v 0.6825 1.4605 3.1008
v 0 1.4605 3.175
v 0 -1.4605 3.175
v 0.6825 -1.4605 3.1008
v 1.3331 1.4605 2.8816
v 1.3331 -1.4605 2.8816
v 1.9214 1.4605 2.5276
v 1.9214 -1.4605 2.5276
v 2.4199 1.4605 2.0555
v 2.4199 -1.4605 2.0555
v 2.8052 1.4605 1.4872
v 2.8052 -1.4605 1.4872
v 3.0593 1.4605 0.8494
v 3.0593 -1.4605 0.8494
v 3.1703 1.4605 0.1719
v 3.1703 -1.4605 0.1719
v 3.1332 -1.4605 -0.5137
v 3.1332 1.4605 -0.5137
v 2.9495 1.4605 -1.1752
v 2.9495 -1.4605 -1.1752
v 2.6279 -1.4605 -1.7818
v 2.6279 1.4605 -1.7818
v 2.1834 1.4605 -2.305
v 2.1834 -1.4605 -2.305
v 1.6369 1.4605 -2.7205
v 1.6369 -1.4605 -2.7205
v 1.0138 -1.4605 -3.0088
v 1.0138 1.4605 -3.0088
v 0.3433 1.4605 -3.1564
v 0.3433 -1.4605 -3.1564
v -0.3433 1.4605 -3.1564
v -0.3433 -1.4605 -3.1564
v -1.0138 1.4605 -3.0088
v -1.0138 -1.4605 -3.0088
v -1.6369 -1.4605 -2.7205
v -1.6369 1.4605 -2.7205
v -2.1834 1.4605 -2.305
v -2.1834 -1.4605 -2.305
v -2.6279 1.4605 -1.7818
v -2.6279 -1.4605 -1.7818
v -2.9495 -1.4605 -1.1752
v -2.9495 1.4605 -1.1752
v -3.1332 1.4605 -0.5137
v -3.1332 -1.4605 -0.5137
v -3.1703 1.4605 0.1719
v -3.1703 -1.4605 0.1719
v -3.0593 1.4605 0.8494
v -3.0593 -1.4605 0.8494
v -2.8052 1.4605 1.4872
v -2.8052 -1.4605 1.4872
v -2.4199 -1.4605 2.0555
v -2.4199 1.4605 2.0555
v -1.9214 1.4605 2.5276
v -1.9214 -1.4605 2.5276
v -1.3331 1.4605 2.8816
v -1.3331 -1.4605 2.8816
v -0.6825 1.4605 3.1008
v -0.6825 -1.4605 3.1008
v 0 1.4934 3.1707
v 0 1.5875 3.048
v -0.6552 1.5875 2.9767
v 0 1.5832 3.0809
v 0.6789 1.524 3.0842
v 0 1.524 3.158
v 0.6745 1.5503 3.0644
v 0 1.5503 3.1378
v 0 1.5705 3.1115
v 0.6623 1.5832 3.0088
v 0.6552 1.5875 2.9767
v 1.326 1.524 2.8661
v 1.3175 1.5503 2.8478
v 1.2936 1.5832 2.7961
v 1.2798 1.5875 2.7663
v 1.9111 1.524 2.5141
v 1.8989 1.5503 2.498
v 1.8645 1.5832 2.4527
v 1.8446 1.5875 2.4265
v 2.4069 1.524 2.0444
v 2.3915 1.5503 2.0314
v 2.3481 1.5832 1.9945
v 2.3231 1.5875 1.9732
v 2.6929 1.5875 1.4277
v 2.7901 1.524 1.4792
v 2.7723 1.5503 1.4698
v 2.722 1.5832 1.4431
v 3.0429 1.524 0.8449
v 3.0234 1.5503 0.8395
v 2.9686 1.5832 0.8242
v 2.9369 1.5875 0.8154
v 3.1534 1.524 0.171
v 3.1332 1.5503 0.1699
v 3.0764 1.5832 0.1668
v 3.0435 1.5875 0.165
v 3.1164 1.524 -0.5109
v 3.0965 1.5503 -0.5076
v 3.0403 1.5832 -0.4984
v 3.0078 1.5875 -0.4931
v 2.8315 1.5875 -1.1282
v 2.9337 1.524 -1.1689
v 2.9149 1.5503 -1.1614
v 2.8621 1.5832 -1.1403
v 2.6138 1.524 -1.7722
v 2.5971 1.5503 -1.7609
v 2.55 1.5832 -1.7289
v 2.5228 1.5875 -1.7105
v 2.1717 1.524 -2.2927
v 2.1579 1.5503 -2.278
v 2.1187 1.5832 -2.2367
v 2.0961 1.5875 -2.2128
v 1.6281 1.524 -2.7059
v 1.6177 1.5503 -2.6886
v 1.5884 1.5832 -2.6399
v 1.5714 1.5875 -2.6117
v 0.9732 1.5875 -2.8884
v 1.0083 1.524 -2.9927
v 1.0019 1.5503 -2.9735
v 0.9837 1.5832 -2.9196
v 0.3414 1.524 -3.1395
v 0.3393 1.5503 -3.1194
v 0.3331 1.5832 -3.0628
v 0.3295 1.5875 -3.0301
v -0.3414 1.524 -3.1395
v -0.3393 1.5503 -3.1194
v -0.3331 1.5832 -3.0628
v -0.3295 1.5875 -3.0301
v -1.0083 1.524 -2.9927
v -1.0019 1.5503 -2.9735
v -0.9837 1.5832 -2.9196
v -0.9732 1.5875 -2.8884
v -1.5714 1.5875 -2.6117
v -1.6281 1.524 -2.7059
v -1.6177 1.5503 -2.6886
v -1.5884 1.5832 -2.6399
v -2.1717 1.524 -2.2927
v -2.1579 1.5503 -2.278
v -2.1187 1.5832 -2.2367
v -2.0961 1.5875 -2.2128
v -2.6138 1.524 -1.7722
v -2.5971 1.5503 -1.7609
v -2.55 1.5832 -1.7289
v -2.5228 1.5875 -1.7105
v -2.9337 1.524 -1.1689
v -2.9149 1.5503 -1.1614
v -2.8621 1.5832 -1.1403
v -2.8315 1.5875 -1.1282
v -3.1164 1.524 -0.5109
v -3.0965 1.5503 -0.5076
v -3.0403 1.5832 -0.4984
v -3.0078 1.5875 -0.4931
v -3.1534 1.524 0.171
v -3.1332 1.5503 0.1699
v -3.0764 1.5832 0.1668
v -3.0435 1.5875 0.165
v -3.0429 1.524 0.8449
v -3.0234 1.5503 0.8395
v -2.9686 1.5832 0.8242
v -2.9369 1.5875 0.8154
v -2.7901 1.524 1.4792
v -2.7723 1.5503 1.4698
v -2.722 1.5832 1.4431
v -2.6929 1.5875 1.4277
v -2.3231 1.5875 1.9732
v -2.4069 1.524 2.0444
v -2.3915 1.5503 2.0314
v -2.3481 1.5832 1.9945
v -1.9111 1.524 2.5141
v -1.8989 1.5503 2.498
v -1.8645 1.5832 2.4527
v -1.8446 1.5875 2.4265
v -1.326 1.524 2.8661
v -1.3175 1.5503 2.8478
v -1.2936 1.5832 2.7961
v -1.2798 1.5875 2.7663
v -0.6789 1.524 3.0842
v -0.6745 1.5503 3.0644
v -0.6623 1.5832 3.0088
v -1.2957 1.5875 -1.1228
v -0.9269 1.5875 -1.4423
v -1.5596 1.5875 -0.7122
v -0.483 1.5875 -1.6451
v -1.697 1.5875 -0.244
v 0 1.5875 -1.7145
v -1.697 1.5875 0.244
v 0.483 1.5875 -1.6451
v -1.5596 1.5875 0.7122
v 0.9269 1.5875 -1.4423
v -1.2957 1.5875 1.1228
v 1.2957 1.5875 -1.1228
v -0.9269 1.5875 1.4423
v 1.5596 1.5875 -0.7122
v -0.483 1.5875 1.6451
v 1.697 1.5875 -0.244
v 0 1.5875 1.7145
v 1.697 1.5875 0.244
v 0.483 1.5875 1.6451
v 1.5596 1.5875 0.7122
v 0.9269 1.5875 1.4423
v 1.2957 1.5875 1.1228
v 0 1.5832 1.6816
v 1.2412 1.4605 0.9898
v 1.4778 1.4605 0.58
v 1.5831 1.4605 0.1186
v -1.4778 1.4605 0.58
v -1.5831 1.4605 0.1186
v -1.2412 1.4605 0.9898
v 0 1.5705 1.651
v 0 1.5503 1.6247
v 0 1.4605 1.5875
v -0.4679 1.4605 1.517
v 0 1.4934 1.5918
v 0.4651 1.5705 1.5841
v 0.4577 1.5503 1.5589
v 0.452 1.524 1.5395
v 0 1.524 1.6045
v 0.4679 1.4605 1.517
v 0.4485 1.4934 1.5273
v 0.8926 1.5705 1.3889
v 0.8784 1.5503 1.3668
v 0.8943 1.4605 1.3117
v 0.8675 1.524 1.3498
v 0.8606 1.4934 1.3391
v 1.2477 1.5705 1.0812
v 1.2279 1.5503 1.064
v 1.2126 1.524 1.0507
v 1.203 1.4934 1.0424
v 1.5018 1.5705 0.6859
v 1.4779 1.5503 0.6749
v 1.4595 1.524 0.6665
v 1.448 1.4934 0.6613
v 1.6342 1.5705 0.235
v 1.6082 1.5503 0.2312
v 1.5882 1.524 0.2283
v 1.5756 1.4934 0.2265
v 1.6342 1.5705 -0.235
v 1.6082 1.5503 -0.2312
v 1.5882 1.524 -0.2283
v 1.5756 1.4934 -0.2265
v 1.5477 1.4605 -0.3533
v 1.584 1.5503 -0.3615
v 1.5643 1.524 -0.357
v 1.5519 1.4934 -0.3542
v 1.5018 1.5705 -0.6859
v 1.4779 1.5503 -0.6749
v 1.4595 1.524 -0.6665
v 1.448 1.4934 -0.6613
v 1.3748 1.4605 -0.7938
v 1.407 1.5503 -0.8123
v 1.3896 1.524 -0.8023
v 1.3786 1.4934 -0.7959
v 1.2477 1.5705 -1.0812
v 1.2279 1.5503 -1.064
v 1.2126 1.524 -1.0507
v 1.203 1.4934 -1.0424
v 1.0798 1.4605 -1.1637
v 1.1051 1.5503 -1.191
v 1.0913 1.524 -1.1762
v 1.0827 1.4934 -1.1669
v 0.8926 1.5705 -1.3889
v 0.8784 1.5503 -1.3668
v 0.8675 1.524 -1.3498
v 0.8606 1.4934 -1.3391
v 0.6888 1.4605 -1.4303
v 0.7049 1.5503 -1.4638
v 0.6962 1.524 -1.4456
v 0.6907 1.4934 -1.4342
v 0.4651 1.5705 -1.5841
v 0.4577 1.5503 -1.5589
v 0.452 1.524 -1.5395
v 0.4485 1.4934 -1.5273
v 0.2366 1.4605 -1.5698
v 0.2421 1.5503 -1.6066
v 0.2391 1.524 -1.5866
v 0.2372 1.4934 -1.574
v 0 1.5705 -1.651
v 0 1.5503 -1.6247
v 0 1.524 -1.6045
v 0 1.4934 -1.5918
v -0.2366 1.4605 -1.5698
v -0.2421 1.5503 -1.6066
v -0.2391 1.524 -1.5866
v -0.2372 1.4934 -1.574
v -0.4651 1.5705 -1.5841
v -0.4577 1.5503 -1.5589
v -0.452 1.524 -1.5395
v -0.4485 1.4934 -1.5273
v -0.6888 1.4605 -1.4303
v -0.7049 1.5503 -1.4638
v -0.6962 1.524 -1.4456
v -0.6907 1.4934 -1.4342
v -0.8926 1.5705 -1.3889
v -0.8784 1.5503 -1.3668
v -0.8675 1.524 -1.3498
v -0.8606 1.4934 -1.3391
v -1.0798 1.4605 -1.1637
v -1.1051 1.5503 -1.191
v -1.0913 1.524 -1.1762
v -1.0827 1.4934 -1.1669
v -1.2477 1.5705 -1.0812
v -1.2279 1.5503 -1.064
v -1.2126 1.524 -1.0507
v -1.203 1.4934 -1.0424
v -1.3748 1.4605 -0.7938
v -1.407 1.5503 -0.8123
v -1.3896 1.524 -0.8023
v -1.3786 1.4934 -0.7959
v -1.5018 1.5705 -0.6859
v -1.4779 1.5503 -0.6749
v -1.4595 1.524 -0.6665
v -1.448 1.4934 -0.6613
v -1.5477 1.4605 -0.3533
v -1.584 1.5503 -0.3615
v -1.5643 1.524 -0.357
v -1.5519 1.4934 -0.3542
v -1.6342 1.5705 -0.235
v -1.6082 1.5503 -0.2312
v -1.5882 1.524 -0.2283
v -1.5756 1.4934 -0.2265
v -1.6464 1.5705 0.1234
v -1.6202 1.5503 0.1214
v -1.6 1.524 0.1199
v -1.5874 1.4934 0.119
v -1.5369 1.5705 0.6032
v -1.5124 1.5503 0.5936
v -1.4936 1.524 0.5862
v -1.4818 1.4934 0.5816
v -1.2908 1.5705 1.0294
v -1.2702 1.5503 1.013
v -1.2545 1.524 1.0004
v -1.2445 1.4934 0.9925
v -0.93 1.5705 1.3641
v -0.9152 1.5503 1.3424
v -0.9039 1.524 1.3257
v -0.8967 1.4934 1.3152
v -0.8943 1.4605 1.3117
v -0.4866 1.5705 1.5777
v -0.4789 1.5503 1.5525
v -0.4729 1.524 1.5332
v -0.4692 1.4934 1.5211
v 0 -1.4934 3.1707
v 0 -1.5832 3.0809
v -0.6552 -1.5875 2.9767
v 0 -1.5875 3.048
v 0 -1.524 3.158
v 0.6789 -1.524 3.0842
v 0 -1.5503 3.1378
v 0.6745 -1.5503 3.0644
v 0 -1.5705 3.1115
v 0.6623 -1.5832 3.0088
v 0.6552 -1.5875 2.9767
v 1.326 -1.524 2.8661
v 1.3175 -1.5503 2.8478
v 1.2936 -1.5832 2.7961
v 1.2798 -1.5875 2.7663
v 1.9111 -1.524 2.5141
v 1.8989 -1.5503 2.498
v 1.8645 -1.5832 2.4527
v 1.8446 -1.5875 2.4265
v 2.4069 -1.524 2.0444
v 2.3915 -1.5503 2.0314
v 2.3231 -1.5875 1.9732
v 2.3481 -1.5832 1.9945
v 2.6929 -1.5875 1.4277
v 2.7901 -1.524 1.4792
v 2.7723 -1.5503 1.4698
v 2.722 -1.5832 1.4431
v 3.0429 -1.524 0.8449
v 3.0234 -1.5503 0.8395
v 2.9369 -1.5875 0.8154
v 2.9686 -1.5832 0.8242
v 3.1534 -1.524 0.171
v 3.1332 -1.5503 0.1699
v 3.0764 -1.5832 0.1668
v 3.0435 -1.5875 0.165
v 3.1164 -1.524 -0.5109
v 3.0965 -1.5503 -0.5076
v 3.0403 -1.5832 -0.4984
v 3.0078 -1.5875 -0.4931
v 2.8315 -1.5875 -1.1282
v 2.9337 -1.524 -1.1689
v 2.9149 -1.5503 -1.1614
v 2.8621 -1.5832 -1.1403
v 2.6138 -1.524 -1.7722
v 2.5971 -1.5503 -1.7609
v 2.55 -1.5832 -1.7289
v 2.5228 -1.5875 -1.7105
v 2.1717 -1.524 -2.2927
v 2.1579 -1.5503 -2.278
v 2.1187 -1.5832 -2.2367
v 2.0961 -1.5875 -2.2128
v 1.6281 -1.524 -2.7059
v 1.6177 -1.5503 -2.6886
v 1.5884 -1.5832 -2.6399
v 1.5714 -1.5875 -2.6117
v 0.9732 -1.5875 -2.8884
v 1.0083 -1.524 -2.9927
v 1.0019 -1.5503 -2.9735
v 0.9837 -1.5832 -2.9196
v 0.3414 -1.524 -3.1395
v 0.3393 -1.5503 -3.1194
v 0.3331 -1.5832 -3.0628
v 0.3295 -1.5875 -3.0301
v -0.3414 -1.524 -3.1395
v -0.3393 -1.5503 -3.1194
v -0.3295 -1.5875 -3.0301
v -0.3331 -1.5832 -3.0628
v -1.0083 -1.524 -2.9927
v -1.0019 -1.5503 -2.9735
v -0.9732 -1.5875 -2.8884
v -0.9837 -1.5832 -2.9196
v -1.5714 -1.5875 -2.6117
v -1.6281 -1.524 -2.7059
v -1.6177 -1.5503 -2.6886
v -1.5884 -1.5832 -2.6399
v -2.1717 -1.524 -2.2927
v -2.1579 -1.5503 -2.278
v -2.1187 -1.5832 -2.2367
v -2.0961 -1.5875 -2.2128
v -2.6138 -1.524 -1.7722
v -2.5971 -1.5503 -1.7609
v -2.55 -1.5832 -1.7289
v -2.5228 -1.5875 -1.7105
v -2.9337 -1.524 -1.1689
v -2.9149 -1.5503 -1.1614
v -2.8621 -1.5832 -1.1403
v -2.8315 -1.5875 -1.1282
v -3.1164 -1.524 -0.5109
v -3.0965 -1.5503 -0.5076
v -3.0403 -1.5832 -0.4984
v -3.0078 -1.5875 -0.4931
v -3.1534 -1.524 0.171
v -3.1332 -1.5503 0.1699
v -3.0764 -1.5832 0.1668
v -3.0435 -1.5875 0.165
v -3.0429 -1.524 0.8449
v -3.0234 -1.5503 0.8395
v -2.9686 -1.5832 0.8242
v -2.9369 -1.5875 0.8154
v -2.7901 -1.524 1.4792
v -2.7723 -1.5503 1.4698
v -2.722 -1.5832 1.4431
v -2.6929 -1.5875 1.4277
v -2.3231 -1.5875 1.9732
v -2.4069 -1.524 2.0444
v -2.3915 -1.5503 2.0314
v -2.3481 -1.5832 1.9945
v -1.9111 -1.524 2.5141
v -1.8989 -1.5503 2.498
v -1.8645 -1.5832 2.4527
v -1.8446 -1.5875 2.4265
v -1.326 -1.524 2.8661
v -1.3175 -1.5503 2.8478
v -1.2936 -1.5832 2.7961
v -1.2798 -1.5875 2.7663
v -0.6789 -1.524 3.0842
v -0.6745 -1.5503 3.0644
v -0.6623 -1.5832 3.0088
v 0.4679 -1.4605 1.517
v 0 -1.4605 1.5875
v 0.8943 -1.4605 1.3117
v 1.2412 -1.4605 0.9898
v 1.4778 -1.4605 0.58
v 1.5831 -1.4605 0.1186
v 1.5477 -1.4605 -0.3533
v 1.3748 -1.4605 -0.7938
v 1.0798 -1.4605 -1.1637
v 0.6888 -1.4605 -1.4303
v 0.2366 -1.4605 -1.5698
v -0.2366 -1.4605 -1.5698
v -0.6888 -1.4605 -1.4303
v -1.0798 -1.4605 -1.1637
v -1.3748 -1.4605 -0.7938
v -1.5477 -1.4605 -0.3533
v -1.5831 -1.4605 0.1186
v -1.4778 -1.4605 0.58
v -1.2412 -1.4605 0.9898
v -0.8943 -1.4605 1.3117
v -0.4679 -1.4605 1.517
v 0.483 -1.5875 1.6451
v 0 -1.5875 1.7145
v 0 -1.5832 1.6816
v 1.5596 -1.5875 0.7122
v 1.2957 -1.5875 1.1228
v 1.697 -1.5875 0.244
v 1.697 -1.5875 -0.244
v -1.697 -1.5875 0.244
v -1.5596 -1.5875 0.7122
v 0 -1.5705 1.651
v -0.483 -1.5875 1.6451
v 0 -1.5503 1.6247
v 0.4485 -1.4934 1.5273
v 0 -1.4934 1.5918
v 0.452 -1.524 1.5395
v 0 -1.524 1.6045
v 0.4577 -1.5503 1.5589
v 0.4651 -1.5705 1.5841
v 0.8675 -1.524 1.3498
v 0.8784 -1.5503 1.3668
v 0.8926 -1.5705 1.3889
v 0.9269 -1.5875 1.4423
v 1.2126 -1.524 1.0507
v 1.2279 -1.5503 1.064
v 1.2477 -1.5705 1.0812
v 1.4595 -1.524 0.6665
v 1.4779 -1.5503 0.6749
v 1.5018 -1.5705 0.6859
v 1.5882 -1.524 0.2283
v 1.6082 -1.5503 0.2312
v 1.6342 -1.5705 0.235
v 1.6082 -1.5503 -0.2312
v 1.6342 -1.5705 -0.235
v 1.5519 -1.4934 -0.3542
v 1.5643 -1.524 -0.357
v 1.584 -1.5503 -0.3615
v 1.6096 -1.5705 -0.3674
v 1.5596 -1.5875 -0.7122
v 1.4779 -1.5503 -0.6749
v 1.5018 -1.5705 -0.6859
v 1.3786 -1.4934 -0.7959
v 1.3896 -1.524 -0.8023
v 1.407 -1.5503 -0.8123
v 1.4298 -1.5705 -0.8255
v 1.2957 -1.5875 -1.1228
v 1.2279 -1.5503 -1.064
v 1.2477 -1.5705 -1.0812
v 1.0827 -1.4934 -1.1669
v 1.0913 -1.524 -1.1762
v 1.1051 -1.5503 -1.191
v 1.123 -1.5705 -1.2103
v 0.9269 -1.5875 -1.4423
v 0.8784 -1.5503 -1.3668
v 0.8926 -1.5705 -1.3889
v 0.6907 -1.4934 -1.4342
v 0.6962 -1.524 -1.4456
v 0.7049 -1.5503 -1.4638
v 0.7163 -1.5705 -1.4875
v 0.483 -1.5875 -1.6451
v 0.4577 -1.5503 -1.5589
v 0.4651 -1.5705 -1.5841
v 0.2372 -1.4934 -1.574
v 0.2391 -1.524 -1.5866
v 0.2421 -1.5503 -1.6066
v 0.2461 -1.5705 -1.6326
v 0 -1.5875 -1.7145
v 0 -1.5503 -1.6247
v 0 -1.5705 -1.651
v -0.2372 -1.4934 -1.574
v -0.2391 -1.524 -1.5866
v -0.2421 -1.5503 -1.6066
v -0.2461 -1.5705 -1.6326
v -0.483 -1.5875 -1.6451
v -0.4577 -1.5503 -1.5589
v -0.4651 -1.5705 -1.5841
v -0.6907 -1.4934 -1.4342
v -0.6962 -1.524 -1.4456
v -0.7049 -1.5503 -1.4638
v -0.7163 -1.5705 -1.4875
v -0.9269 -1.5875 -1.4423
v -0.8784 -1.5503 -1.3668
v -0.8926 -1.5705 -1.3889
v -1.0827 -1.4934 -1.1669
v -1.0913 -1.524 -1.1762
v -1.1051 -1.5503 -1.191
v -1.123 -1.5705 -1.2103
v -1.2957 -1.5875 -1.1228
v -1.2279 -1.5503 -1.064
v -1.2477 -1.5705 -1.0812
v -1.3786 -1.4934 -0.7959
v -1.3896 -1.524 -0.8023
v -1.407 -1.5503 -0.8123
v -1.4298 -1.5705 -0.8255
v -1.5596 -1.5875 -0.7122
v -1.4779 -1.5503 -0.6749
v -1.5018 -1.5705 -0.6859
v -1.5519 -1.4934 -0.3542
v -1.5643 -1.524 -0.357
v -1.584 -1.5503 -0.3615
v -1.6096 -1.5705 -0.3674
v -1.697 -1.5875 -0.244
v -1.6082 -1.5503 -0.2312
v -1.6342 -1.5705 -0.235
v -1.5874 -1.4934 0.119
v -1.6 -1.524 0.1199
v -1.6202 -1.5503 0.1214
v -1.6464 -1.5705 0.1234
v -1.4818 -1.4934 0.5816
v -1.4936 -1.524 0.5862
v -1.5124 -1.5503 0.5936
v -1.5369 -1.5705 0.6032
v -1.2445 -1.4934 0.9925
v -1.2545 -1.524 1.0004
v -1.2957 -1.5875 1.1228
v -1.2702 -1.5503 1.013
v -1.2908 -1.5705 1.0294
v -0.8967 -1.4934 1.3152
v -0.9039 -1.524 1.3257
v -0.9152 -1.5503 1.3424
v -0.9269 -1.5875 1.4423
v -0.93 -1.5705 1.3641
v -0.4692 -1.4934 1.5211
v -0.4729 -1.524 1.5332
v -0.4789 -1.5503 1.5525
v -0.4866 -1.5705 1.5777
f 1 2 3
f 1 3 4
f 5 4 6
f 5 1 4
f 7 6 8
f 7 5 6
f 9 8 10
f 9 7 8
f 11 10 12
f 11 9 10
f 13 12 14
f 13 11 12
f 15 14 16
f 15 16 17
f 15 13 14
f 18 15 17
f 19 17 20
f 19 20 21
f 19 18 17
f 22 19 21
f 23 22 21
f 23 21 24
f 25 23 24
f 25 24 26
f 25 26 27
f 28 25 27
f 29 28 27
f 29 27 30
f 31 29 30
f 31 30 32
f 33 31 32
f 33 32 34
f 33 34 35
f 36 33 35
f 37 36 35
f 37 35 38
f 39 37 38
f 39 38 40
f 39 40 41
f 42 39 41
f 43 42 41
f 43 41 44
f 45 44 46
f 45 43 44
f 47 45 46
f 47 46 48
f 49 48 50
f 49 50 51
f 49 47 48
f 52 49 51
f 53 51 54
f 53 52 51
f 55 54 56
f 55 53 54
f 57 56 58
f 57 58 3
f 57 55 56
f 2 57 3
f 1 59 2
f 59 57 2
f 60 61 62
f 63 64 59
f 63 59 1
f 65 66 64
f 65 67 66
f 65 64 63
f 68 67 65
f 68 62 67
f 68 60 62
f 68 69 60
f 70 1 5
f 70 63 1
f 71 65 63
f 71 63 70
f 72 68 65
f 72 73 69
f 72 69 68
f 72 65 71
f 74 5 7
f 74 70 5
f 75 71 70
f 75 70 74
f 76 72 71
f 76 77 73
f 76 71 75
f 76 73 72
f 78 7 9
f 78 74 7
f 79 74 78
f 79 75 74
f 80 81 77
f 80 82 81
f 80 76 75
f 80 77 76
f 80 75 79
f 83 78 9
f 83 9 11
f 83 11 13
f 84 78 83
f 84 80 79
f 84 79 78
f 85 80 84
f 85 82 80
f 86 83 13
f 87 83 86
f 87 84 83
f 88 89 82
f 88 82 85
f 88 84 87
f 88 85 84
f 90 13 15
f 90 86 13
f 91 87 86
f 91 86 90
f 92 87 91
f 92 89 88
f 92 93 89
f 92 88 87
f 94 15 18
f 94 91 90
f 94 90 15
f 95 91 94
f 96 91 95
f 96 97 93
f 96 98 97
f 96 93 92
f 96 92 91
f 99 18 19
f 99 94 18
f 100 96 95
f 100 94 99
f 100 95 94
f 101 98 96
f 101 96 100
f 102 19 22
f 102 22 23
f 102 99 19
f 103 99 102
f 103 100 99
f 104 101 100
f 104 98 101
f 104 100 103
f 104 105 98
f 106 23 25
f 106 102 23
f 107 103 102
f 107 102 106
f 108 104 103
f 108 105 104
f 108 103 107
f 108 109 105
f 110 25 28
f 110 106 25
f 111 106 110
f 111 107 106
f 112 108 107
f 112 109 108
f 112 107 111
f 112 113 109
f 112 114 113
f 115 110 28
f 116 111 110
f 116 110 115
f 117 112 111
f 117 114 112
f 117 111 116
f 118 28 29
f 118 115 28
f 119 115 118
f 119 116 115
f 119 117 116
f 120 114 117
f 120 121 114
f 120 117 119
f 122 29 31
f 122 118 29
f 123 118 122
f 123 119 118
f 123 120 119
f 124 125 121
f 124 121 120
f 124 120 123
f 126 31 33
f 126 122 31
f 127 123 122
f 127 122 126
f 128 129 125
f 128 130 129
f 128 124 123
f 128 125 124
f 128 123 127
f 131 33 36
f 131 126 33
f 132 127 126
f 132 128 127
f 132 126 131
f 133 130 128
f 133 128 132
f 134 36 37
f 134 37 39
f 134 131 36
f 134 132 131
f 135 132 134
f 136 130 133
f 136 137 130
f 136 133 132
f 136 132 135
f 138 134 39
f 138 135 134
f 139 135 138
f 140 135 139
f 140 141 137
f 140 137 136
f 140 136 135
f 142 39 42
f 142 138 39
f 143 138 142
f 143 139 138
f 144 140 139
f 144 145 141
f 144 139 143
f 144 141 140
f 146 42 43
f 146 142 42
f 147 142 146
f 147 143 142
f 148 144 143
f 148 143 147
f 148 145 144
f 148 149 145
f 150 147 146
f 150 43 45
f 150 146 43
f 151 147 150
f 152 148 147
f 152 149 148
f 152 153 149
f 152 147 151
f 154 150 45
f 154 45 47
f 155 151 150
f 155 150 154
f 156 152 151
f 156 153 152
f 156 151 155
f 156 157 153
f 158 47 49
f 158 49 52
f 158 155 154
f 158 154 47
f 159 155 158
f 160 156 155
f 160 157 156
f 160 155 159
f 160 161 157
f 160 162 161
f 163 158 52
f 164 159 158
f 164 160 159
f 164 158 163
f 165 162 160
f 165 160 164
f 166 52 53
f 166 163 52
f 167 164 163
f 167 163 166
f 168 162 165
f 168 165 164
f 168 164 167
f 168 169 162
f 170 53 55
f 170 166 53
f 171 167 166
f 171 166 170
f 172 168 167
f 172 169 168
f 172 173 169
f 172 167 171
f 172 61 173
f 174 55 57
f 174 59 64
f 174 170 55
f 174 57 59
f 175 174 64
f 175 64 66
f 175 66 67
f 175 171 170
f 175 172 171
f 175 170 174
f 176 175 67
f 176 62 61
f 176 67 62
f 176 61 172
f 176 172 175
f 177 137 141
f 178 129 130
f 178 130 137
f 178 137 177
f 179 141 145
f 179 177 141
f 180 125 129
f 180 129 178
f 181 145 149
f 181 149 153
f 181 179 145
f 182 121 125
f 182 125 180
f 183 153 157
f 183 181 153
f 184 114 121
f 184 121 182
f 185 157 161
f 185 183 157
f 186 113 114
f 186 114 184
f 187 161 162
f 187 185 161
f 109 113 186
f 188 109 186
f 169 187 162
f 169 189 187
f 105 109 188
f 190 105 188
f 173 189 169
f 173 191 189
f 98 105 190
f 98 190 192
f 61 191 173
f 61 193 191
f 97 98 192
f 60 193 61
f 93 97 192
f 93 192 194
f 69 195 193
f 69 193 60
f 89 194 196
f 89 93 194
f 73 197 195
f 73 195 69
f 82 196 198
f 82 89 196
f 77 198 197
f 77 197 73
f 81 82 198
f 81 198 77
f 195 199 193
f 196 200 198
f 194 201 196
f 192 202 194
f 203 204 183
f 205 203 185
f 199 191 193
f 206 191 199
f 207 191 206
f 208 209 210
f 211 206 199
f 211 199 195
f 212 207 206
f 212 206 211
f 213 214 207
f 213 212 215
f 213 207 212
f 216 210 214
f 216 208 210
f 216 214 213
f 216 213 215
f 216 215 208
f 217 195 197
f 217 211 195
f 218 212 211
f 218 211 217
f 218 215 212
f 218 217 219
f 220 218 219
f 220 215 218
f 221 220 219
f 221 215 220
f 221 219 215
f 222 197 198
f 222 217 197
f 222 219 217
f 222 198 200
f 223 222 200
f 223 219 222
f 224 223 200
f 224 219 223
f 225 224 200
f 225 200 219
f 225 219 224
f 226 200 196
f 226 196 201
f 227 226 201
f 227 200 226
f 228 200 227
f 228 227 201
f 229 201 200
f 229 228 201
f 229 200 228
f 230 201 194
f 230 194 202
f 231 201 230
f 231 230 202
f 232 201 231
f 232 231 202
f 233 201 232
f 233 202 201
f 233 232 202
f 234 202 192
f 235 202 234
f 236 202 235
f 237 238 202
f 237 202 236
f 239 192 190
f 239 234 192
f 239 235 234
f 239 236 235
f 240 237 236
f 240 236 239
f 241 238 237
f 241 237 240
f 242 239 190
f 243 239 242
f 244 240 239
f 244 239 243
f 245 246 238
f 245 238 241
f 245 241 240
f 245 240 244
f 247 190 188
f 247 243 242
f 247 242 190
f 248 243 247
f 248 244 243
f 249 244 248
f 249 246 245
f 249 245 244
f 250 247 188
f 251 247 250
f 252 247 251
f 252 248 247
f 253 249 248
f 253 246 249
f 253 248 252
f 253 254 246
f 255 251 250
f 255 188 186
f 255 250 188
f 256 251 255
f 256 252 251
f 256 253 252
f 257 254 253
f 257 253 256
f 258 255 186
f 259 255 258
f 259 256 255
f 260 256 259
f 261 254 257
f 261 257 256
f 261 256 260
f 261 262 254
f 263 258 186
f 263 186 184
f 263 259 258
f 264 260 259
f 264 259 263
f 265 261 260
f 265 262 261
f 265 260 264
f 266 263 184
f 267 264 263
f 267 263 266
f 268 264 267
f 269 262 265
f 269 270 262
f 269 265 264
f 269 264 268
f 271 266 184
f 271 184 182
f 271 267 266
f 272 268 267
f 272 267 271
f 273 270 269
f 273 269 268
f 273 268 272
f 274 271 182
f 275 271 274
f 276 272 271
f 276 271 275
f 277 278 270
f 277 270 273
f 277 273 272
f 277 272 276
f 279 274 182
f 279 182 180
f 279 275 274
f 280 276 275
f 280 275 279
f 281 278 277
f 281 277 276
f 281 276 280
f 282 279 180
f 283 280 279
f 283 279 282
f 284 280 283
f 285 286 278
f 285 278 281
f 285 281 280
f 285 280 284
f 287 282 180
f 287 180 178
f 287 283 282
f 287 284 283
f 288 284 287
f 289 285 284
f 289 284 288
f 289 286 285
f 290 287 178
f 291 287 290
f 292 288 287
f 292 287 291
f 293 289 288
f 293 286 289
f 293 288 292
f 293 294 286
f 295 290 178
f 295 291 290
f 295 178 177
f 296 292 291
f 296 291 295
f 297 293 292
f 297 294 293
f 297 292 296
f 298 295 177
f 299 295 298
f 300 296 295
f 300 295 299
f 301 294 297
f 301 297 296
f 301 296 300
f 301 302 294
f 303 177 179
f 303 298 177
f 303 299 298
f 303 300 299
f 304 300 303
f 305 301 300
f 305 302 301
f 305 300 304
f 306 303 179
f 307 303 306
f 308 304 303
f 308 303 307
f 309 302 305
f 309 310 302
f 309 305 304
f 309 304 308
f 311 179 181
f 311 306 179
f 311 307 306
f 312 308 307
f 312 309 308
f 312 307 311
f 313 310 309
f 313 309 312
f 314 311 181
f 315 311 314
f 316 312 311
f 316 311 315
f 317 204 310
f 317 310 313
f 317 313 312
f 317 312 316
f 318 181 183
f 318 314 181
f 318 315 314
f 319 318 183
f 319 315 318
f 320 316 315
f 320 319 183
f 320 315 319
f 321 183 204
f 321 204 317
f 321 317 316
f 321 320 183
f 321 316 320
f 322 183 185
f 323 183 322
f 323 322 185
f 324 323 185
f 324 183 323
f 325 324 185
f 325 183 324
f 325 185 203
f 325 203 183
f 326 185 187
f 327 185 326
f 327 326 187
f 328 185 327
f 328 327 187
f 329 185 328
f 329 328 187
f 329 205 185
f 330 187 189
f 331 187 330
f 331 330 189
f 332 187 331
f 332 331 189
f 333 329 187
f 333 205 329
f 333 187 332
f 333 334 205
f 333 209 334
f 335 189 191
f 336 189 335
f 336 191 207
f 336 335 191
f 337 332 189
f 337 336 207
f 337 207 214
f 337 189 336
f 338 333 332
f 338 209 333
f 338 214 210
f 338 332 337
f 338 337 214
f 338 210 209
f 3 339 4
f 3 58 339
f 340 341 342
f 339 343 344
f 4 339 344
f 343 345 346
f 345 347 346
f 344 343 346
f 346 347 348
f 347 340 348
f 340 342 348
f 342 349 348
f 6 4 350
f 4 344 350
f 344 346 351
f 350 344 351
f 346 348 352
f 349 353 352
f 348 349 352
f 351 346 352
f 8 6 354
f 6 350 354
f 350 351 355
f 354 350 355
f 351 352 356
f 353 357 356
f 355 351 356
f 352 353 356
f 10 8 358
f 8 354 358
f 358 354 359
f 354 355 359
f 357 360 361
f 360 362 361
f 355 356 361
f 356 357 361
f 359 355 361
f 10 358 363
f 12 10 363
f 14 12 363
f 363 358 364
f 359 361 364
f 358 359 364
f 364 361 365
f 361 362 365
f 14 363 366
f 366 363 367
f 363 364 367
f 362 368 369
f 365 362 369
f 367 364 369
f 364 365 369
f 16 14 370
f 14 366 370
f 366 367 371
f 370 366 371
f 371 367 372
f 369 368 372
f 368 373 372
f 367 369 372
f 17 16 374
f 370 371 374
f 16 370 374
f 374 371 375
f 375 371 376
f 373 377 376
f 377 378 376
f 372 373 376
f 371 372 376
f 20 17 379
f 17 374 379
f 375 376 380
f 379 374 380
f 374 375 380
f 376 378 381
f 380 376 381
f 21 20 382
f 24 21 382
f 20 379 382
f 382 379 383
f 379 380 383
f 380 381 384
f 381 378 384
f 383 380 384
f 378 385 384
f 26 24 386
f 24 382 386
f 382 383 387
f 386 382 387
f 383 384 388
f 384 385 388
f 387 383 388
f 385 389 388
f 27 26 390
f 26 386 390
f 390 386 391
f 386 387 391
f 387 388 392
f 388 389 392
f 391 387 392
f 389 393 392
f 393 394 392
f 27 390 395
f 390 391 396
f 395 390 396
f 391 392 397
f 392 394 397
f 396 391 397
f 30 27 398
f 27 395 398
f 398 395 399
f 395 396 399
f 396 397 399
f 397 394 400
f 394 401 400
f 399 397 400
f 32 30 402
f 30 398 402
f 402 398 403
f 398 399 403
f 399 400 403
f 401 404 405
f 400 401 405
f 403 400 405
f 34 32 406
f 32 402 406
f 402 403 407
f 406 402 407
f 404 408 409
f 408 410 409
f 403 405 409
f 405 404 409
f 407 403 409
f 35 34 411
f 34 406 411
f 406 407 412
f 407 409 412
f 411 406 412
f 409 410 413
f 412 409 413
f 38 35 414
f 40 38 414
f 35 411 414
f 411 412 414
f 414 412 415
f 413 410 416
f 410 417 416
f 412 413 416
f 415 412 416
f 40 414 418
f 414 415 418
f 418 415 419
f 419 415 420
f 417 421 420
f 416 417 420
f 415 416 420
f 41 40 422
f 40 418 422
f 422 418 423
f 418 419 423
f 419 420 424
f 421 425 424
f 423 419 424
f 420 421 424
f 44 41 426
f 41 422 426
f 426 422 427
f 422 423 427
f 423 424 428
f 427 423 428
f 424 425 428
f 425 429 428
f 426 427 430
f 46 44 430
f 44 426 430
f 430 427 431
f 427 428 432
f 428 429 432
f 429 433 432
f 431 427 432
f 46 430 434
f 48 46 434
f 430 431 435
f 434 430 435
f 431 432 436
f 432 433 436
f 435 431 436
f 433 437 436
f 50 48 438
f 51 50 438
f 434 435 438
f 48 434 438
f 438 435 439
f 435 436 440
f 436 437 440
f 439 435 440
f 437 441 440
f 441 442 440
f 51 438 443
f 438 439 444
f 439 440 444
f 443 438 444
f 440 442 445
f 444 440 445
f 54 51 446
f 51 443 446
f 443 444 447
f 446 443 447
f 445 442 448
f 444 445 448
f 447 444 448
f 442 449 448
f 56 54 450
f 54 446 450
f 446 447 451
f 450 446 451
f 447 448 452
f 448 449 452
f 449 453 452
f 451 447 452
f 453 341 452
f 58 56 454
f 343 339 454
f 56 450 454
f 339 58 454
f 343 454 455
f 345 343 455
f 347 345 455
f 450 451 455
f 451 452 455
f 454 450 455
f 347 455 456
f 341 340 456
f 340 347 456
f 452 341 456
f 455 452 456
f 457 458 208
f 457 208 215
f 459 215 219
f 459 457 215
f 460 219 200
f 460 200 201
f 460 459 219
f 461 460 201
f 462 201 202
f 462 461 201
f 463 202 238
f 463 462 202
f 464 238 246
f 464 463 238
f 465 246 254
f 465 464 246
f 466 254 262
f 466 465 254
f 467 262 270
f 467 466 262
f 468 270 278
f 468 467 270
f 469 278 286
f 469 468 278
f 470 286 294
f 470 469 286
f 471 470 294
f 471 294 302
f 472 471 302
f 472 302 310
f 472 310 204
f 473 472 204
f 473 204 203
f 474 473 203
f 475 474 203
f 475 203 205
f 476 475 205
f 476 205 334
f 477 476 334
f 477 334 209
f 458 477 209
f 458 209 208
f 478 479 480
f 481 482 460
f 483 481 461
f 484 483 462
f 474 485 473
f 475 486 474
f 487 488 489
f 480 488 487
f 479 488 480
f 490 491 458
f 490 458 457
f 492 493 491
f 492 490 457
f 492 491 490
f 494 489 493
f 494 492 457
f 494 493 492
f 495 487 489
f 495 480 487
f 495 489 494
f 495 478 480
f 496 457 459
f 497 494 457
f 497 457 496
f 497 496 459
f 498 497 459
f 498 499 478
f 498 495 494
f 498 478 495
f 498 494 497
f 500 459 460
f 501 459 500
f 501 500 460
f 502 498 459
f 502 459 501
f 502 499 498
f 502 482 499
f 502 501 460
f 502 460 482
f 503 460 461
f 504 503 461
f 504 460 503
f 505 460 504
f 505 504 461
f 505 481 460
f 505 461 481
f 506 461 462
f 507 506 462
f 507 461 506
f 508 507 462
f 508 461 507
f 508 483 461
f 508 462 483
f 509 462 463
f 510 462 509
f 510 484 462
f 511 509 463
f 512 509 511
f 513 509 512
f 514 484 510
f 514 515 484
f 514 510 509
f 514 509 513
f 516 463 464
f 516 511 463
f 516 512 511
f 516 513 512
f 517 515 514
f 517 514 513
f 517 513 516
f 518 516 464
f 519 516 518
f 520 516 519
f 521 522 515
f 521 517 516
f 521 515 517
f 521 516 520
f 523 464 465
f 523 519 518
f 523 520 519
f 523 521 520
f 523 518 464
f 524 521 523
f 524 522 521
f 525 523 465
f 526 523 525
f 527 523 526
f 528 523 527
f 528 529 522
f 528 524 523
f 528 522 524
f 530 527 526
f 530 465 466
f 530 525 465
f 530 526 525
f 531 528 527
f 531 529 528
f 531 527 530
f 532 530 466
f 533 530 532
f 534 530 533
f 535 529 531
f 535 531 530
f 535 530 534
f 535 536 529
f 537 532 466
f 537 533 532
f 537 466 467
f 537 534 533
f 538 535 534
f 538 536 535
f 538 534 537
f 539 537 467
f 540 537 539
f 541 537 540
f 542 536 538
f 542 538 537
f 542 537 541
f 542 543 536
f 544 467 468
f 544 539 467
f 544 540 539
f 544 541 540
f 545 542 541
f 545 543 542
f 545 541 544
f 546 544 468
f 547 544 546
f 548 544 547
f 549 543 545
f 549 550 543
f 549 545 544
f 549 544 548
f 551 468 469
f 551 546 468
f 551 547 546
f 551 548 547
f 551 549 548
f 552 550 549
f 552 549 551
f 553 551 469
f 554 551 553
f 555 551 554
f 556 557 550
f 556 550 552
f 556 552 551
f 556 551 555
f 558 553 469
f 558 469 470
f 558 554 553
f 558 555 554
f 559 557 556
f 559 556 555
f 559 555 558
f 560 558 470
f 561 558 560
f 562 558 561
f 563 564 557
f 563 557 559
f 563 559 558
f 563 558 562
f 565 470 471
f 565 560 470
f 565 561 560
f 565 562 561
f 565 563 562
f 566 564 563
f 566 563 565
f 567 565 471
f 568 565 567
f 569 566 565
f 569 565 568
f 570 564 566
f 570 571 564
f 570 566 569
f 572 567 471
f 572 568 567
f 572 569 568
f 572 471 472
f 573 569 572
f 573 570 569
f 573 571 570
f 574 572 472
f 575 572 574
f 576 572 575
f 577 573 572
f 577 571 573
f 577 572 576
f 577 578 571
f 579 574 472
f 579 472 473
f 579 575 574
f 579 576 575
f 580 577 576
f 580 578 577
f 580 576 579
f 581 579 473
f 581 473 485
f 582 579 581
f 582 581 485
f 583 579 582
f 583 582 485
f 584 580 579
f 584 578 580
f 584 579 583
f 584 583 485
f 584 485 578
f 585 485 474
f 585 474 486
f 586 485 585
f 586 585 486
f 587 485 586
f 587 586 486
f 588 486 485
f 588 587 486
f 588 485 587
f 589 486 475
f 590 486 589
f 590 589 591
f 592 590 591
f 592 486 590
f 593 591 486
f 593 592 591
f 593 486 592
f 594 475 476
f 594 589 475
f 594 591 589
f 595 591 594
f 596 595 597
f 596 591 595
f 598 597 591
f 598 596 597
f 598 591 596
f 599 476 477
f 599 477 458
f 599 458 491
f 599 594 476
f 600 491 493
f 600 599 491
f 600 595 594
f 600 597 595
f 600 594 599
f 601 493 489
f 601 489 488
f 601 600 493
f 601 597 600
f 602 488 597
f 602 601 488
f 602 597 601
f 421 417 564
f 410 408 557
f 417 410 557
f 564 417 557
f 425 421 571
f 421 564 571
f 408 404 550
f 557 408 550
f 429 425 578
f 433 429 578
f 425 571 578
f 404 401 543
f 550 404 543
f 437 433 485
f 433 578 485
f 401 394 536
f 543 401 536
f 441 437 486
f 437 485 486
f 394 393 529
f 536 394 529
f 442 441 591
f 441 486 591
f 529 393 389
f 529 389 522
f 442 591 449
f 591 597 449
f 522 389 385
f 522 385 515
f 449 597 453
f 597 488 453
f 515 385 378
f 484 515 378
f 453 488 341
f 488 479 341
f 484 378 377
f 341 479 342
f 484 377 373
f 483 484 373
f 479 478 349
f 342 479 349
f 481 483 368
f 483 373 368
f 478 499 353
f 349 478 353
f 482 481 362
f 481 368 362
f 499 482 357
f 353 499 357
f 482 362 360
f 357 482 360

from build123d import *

# Parameters (mm, degrees)
SKETCH1_R           = 3.175
SKETCH1_R_2         = 1.5875
BOSS_EXTRUDE1_DEPTH = 1.5875
FILLET1_R           = 0.127


with BuildPart() as part:
    # Sketch1 → Boss-Extrude1 (new, symmetric)
    with BuildSketch(Plane(origin=(0, 0, 0), x_dir=(1, 0, 0), z_dir=(0, 1, 0))):
        with Locations(Location((0, 0, 0), (0, 0, 270))):
            Circle(SKETCH1_R)
        with Locations(Location((0, 0, 0), (0, 0, 270))):
            Circle(SKETCH1_R_2, mode=Mode.SUBTRACT)
    extrude(amount=BOSS_EXTRUDE1_DEPTH, both=True)

    # Fillet1
    fillet1_edges = [part.edges().sort_by_distance(p)[0] for p in [
        (0, -1.5875, -3.175),
        (0, 1.5875, -3.175),
        (0, -1.5875, -1.5875),
        (0, 1.5875, -1.5875),
    ]]
    fillet(fillet1_edges, radius=FILLET1_R)


solid = part.part
